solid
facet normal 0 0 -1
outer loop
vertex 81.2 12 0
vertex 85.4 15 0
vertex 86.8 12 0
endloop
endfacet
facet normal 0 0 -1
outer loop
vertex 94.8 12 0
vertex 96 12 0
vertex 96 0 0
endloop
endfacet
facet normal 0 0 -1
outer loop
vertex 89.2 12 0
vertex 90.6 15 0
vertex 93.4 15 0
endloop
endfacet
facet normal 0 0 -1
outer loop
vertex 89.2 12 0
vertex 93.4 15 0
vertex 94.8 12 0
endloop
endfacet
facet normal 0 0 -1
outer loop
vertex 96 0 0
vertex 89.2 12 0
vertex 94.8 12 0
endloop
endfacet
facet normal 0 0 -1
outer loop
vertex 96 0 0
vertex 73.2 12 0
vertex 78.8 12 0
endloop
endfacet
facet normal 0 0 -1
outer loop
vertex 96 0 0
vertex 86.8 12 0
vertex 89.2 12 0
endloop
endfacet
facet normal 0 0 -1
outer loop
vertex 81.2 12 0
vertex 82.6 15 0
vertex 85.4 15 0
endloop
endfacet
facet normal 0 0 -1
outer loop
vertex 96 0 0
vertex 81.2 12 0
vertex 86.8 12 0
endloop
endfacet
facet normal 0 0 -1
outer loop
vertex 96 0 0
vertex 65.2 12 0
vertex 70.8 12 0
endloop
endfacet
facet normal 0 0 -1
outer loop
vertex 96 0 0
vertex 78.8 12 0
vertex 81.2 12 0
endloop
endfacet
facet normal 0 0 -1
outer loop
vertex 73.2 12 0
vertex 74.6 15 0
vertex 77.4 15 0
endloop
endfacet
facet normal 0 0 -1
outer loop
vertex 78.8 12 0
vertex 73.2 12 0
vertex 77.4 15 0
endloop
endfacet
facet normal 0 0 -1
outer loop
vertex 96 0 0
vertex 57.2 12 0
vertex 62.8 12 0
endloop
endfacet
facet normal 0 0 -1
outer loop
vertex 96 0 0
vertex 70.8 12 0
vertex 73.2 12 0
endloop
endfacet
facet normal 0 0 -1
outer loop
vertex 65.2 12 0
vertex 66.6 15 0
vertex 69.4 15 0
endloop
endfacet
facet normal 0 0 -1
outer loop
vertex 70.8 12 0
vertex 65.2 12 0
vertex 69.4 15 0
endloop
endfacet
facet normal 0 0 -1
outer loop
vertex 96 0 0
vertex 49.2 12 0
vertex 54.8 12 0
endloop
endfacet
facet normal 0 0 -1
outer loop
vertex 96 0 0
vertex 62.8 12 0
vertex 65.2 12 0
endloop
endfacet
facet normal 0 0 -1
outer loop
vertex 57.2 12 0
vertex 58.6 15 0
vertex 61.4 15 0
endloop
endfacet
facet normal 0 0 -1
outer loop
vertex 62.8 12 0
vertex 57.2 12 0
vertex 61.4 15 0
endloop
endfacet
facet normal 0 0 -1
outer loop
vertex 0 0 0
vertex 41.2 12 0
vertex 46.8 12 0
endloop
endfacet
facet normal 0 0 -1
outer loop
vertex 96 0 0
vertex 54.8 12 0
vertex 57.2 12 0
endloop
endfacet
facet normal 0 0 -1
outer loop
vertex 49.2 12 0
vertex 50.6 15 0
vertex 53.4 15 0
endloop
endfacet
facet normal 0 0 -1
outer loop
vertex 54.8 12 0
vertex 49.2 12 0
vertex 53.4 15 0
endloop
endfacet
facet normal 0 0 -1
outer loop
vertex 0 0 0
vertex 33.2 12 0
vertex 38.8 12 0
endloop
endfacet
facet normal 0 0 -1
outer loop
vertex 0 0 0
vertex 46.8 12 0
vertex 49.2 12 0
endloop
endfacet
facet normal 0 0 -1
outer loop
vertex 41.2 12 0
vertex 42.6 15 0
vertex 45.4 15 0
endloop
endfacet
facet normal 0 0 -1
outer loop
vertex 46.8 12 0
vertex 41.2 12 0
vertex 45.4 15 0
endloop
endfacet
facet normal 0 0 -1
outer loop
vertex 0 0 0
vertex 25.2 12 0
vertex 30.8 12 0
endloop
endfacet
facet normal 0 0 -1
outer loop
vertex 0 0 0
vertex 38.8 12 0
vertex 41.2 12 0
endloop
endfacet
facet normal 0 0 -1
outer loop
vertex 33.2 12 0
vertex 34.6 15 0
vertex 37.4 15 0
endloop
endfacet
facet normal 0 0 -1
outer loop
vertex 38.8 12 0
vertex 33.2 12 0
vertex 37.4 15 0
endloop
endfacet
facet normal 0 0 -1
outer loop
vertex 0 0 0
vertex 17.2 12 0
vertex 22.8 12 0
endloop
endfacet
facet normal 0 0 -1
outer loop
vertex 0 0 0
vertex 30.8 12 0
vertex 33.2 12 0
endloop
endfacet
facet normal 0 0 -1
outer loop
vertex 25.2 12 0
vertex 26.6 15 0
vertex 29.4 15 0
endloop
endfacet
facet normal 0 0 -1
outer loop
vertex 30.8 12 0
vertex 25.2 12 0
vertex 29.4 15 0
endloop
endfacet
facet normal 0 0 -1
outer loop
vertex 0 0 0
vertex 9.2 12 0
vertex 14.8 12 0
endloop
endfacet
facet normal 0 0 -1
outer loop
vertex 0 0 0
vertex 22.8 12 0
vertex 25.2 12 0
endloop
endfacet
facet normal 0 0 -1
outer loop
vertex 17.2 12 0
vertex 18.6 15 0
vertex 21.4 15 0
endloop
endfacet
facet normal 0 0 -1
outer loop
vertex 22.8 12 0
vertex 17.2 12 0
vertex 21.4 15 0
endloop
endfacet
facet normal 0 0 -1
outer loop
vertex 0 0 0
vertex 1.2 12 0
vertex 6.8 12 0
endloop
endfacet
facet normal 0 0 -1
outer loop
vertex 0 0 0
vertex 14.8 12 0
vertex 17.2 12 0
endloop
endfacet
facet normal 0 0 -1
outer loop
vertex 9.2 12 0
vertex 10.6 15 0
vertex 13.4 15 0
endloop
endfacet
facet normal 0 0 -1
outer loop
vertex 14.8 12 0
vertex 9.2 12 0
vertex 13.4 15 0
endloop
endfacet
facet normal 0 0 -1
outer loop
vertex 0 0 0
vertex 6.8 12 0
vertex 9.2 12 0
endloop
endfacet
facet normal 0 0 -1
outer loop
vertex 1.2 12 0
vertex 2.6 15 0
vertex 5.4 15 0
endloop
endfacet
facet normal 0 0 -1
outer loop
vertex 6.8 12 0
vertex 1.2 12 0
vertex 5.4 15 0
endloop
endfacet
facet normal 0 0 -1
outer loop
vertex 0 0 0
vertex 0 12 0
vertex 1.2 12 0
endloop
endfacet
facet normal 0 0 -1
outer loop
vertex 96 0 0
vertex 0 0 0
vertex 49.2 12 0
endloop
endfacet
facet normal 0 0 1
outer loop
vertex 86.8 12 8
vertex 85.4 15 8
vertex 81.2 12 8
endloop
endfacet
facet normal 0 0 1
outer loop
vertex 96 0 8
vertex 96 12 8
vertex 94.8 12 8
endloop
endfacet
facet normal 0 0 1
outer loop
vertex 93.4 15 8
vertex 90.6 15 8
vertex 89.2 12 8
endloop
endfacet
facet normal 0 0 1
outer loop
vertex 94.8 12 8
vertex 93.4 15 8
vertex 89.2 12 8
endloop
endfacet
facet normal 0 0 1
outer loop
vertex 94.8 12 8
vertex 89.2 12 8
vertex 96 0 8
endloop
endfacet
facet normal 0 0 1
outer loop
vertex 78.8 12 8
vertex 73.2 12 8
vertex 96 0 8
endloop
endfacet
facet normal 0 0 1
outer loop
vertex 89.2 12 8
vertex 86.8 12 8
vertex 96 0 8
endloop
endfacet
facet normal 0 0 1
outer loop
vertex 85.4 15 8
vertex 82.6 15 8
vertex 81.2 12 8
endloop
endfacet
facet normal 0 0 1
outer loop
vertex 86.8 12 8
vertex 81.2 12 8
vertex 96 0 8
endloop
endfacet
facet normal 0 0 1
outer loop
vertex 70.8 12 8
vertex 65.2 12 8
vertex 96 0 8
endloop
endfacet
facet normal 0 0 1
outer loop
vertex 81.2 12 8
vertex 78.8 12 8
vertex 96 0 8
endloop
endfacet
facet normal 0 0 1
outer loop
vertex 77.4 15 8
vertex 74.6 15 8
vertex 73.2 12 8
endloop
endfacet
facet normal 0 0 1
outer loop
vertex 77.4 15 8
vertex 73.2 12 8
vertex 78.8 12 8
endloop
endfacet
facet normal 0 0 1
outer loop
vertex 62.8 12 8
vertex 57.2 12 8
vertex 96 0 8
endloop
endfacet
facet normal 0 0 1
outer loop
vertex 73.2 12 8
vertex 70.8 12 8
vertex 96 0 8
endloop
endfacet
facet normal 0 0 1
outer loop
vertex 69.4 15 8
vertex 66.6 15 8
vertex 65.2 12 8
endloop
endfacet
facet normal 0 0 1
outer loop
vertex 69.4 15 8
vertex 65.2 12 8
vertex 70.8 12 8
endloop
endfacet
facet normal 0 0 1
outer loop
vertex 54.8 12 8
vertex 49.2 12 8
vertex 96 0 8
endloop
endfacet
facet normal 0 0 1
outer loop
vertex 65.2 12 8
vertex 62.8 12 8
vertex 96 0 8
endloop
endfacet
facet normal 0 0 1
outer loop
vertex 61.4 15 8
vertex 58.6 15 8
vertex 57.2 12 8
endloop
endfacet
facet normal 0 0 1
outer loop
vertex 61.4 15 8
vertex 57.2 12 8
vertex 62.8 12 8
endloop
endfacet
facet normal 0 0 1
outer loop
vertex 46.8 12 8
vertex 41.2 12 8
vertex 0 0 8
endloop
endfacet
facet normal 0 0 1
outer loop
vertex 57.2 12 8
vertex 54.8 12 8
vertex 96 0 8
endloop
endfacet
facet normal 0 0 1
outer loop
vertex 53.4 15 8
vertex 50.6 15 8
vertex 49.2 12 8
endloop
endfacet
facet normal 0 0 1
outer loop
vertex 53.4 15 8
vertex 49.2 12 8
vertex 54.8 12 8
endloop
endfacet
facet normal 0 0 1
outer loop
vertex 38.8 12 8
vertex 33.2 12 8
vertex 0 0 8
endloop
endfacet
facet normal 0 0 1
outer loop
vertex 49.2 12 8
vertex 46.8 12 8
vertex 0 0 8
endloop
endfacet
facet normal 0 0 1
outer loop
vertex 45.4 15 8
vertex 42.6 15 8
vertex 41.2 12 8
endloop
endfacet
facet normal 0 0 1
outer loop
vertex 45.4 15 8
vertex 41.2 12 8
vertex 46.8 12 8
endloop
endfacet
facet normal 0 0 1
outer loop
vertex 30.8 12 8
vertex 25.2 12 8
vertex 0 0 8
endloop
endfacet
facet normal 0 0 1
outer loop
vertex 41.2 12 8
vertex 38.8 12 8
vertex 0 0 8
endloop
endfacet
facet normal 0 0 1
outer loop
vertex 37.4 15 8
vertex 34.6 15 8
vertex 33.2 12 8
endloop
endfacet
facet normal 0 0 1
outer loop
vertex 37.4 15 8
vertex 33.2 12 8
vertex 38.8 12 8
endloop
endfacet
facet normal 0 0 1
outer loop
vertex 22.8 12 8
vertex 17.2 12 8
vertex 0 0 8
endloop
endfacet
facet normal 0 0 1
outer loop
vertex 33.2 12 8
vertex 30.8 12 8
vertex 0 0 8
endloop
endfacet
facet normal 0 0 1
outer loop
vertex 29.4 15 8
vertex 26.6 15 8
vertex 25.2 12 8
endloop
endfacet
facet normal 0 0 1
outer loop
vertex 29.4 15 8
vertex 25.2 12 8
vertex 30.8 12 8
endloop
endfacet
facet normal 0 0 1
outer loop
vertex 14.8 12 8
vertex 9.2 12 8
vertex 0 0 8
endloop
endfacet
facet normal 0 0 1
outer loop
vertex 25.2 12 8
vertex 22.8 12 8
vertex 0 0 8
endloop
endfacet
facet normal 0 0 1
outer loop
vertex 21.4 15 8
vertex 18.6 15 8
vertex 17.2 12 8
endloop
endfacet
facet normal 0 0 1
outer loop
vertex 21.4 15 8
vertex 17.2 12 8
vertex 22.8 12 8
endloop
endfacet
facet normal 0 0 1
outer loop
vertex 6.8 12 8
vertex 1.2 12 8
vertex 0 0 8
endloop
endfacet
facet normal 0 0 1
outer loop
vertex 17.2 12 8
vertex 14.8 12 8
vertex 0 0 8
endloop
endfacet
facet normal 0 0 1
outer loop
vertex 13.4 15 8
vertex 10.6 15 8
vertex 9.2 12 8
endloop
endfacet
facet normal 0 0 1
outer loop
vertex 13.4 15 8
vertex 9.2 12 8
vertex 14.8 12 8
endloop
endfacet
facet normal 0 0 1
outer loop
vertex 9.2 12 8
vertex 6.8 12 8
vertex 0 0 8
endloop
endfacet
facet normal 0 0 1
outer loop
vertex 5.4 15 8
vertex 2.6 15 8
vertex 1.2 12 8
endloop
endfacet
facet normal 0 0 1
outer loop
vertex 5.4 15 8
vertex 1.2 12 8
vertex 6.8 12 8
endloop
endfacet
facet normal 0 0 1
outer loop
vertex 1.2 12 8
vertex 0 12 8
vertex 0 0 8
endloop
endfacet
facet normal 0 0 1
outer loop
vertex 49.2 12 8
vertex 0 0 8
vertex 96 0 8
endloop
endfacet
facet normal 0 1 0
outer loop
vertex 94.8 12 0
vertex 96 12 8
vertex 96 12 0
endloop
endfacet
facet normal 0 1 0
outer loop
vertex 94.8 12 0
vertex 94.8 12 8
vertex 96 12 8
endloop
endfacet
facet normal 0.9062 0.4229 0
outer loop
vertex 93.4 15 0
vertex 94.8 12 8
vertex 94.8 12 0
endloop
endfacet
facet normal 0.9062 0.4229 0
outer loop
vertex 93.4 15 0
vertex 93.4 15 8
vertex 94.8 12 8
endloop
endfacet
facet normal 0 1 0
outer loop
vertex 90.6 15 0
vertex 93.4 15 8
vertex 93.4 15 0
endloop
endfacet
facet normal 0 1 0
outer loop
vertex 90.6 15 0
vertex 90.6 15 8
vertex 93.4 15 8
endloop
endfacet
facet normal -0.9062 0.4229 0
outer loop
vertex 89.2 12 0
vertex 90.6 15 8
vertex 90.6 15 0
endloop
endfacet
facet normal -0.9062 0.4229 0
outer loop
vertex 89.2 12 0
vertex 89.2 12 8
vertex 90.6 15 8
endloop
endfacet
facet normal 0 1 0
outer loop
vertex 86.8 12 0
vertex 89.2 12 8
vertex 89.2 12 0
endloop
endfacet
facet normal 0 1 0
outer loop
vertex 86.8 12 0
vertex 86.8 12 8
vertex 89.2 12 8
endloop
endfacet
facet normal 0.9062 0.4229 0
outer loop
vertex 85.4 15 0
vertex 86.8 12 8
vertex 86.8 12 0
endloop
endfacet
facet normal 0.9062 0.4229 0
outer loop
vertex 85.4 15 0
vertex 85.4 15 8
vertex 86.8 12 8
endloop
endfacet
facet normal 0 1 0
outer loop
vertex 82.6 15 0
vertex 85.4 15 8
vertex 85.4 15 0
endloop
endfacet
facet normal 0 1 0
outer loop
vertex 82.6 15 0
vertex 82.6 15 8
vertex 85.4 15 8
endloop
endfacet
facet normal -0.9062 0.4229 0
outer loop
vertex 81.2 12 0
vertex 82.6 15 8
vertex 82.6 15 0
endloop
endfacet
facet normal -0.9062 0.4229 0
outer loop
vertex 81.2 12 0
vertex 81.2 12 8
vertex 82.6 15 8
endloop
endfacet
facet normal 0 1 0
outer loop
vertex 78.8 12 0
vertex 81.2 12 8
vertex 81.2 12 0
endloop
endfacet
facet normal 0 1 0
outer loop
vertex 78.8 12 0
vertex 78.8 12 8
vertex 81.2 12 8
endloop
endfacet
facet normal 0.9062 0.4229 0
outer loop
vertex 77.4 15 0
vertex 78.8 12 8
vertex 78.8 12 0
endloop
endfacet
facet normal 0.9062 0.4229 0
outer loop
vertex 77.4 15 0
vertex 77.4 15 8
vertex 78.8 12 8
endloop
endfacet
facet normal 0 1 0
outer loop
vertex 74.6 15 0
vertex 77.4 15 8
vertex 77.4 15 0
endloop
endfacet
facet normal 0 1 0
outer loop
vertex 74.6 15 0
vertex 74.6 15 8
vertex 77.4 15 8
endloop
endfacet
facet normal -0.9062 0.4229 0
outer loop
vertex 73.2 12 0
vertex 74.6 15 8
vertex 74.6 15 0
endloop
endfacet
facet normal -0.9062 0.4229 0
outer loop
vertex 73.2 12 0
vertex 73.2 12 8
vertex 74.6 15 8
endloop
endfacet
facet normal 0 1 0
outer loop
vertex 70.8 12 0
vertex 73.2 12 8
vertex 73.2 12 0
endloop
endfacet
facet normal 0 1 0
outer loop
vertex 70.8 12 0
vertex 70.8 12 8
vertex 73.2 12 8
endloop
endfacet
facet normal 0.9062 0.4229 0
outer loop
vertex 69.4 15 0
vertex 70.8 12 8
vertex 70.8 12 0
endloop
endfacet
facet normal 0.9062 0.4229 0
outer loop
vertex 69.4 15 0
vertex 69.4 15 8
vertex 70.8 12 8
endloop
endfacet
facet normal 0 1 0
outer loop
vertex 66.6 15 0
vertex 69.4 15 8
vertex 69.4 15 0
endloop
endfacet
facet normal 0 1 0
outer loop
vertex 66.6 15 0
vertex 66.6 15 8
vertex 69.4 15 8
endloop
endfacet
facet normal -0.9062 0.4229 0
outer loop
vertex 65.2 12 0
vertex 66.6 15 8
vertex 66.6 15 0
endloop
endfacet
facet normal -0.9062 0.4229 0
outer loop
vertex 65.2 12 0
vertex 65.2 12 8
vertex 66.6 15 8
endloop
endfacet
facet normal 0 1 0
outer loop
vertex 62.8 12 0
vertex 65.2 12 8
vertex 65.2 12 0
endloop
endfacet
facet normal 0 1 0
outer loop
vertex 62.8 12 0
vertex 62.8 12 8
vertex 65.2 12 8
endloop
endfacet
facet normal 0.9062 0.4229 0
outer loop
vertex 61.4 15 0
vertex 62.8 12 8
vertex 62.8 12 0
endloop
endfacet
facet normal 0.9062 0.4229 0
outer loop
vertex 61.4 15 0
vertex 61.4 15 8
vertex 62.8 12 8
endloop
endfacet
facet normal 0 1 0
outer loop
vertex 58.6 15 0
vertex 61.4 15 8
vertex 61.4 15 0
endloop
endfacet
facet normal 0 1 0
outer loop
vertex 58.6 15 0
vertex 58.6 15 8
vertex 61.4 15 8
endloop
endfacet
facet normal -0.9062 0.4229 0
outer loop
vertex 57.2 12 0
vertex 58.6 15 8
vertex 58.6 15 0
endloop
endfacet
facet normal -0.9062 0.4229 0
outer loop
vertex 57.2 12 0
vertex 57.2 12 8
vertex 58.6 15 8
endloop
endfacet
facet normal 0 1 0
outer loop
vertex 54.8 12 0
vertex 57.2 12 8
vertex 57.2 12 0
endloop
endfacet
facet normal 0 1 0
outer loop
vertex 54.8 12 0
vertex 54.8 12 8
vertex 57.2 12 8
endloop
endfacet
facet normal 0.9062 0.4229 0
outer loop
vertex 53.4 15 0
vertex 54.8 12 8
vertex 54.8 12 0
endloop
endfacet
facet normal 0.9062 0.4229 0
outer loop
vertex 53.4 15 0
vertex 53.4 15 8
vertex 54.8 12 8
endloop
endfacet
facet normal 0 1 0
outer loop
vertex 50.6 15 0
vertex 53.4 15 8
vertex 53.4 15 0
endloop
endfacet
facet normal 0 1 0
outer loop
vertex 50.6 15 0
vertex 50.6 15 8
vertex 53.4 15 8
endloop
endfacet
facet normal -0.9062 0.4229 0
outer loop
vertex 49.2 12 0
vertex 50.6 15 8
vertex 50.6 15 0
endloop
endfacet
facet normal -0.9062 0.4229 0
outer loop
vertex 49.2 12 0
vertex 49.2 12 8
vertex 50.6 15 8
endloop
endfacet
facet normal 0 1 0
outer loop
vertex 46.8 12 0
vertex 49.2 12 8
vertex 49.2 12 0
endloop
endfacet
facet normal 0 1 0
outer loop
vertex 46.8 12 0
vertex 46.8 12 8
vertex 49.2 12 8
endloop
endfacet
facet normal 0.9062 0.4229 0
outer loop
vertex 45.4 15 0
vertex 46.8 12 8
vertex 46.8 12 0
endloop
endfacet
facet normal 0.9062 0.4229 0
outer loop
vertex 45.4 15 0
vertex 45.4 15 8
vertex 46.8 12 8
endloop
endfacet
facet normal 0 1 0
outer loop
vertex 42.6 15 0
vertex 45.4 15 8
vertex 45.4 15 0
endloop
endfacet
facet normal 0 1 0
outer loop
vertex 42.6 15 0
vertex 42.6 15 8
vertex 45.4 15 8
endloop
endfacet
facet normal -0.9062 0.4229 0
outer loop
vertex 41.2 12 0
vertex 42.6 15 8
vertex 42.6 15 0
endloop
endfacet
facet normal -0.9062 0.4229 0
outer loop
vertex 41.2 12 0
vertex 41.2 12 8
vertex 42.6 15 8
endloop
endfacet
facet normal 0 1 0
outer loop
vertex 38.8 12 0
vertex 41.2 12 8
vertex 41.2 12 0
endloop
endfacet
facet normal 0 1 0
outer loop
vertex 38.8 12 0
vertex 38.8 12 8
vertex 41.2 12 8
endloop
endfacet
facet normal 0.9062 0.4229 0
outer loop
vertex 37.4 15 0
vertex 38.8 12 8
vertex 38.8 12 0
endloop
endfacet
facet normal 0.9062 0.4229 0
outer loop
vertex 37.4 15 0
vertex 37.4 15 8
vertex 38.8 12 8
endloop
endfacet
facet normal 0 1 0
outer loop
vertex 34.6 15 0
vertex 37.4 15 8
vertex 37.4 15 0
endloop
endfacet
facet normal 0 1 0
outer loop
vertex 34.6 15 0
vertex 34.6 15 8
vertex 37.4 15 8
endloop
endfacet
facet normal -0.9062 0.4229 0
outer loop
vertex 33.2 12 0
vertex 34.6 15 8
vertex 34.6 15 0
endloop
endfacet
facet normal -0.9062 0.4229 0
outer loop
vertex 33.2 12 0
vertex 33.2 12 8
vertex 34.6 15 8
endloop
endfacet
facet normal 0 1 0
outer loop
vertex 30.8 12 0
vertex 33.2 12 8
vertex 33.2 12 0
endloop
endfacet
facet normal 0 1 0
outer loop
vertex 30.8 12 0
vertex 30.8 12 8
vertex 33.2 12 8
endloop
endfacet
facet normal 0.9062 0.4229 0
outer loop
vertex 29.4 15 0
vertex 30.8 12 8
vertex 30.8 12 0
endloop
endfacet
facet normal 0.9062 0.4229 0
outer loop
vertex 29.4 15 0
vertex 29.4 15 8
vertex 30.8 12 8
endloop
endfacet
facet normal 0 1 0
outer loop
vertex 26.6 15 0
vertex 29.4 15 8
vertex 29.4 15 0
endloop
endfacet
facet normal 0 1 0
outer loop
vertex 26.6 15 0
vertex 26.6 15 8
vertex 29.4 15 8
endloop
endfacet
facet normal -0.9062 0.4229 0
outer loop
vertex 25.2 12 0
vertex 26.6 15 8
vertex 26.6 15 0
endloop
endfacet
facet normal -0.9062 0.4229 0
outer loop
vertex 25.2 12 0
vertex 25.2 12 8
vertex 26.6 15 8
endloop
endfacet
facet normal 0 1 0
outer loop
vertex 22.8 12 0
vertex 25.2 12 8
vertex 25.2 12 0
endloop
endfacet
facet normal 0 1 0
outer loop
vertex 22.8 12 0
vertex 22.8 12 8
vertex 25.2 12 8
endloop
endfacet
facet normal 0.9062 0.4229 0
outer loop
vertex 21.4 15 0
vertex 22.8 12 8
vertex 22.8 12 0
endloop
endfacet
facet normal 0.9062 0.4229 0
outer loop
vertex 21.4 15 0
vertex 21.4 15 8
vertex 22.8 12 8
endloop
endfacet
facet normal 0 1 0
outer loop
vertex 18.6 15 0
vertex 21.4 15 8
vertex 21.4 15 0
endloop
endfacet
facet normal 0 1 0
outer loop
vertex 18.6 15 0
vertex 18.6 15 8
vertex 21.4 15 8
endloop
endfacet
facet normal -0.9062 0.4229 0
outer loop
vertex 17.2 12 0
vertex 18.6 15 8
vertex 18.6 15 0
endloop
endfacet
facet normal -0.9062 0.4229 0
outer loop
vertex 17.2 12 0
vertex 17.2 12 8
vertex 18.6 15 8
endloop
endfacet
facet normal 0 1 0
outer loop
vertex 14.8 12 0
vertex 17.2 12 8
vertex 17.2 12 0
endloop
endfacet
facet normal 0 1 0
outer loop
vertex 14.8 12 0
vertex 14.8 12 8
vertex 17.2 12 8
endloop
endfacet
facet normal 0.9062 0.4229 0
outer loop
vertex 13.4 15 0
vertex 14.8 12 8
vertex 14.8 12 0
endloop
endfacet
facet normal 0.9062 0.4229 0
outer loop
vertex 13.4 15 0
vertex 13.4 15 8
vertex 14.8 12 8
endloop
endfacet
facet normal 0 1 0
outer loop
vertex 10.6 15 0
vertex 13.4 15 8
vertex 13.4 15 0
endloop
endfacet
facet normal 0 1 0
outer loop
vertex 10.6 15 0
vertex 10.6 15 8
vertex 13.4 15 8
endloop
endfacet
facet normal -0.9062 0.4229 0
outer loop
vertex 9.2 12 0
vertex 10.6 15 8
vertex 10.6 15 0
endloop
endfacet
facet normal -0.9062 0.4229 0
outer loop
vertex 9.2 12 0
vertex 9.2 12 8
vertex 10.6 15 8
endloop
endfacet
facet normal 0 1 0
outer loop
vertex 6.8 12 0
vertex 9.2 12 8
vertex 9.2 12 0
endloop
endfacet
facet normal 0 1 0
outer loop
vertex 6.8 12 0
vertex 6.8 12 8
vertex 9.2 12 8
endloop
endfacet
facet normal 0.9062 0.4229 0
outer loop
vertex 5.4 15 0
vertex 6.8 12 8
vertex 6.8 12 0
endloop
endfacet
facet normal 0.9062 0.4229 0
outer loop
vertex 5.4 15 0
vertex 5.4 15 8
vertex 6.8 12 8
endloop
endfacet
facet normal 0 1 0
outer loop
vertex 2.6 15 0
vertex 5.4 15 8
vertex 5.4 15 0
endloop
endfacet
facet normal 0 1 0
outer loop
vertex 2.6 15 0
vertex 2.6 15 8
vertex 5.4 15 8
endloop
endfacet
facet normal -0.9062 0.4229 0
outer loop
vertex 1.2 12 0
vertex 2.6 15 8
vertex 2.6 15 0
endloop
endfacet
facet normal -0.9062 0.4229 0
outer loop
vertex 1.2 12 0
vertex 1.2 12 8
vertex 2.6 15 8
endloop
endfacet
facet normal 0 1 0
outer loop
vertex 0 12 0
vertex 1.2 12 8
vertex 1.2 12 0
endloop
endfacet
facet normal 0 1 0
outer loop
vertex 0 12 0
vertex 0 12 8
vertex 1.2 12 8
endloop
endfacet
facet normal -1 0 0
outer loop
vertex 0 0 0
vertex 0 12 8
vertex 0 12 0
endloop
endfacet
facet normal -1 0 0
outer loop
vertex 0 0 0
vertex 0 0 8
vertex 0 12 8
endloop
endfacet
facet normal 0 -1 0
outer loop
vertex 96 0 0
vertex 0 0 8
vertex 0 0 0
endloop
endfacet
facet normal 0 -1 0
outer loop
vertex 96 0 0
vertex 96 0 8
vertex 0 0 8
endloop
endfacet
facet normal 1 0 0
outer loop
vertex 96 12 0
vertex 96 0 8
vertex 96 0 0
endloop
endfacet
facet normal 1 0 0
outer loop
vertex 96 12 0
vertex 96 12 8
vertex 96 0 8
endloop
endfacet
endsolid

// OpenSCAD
$fn = 32;

// ----------------------------------------------------------------------
// Gear rack: 12 teeth, pitch 8 mm
// ----------------------------------------------------------------------

// --- parameters (mm) ---
teeth = 12;               // number of teeth
pitch = 8;                // tooth pitch, X
root_w = 5.6;             // tooth width at the root
tip_w = 2.8;              // tooth width at the tip
base_h = 12;              // rack body height, Y
tooth_h = 3;              // tooth height above the body
plate_t = 8;              // rack width, Z (extrusion height)

rack_l = teeth * pitch;  // overall length
total_h = base_h + tooth_h;  // overall height

profile = [[0, 0], [96, 0], [96, 12], [94.8, 12], [93.4, 15], [90.6, 15], [89.2, 12], [86.8, 12], [85.4, 15], [82.6, 15], [81.2, 12], [78.8, 12], [77.4, 15], [74.6, 15], [73.2, 12], [70.8, 12], [69.4, 15], [66.6, 15], [65.2, 12], [62.8, 12], [61.4, 15], [58.6, 15], [57.2, 12], [54.8, 12], [53.4, 15], [50.6, 15], [49.2, 12], [46.8, 12], [45.4, 15], [42.6, 15], [41.2, 12], [38.8, 12], [37.4, 15], [34.6, 15], [33.2, 12], [30.8, 12], [29.4, 15], [26.6, 15], [25.2, 12], [22.8, 12], [21.4, 15], [18.6, 15], [17.2, 12], [14.8, 12], [13.4, 15], [10.6, 15], [9.2, 12], [6.8, 12], [5.4, 15], [2.6, 15], [1.2, 12], [0, 12]];  // primary outline, 52 points, counter clockwise

// --- the one profile operation ---
linear_extrude(height = plate_t) polygon(points = profile);
